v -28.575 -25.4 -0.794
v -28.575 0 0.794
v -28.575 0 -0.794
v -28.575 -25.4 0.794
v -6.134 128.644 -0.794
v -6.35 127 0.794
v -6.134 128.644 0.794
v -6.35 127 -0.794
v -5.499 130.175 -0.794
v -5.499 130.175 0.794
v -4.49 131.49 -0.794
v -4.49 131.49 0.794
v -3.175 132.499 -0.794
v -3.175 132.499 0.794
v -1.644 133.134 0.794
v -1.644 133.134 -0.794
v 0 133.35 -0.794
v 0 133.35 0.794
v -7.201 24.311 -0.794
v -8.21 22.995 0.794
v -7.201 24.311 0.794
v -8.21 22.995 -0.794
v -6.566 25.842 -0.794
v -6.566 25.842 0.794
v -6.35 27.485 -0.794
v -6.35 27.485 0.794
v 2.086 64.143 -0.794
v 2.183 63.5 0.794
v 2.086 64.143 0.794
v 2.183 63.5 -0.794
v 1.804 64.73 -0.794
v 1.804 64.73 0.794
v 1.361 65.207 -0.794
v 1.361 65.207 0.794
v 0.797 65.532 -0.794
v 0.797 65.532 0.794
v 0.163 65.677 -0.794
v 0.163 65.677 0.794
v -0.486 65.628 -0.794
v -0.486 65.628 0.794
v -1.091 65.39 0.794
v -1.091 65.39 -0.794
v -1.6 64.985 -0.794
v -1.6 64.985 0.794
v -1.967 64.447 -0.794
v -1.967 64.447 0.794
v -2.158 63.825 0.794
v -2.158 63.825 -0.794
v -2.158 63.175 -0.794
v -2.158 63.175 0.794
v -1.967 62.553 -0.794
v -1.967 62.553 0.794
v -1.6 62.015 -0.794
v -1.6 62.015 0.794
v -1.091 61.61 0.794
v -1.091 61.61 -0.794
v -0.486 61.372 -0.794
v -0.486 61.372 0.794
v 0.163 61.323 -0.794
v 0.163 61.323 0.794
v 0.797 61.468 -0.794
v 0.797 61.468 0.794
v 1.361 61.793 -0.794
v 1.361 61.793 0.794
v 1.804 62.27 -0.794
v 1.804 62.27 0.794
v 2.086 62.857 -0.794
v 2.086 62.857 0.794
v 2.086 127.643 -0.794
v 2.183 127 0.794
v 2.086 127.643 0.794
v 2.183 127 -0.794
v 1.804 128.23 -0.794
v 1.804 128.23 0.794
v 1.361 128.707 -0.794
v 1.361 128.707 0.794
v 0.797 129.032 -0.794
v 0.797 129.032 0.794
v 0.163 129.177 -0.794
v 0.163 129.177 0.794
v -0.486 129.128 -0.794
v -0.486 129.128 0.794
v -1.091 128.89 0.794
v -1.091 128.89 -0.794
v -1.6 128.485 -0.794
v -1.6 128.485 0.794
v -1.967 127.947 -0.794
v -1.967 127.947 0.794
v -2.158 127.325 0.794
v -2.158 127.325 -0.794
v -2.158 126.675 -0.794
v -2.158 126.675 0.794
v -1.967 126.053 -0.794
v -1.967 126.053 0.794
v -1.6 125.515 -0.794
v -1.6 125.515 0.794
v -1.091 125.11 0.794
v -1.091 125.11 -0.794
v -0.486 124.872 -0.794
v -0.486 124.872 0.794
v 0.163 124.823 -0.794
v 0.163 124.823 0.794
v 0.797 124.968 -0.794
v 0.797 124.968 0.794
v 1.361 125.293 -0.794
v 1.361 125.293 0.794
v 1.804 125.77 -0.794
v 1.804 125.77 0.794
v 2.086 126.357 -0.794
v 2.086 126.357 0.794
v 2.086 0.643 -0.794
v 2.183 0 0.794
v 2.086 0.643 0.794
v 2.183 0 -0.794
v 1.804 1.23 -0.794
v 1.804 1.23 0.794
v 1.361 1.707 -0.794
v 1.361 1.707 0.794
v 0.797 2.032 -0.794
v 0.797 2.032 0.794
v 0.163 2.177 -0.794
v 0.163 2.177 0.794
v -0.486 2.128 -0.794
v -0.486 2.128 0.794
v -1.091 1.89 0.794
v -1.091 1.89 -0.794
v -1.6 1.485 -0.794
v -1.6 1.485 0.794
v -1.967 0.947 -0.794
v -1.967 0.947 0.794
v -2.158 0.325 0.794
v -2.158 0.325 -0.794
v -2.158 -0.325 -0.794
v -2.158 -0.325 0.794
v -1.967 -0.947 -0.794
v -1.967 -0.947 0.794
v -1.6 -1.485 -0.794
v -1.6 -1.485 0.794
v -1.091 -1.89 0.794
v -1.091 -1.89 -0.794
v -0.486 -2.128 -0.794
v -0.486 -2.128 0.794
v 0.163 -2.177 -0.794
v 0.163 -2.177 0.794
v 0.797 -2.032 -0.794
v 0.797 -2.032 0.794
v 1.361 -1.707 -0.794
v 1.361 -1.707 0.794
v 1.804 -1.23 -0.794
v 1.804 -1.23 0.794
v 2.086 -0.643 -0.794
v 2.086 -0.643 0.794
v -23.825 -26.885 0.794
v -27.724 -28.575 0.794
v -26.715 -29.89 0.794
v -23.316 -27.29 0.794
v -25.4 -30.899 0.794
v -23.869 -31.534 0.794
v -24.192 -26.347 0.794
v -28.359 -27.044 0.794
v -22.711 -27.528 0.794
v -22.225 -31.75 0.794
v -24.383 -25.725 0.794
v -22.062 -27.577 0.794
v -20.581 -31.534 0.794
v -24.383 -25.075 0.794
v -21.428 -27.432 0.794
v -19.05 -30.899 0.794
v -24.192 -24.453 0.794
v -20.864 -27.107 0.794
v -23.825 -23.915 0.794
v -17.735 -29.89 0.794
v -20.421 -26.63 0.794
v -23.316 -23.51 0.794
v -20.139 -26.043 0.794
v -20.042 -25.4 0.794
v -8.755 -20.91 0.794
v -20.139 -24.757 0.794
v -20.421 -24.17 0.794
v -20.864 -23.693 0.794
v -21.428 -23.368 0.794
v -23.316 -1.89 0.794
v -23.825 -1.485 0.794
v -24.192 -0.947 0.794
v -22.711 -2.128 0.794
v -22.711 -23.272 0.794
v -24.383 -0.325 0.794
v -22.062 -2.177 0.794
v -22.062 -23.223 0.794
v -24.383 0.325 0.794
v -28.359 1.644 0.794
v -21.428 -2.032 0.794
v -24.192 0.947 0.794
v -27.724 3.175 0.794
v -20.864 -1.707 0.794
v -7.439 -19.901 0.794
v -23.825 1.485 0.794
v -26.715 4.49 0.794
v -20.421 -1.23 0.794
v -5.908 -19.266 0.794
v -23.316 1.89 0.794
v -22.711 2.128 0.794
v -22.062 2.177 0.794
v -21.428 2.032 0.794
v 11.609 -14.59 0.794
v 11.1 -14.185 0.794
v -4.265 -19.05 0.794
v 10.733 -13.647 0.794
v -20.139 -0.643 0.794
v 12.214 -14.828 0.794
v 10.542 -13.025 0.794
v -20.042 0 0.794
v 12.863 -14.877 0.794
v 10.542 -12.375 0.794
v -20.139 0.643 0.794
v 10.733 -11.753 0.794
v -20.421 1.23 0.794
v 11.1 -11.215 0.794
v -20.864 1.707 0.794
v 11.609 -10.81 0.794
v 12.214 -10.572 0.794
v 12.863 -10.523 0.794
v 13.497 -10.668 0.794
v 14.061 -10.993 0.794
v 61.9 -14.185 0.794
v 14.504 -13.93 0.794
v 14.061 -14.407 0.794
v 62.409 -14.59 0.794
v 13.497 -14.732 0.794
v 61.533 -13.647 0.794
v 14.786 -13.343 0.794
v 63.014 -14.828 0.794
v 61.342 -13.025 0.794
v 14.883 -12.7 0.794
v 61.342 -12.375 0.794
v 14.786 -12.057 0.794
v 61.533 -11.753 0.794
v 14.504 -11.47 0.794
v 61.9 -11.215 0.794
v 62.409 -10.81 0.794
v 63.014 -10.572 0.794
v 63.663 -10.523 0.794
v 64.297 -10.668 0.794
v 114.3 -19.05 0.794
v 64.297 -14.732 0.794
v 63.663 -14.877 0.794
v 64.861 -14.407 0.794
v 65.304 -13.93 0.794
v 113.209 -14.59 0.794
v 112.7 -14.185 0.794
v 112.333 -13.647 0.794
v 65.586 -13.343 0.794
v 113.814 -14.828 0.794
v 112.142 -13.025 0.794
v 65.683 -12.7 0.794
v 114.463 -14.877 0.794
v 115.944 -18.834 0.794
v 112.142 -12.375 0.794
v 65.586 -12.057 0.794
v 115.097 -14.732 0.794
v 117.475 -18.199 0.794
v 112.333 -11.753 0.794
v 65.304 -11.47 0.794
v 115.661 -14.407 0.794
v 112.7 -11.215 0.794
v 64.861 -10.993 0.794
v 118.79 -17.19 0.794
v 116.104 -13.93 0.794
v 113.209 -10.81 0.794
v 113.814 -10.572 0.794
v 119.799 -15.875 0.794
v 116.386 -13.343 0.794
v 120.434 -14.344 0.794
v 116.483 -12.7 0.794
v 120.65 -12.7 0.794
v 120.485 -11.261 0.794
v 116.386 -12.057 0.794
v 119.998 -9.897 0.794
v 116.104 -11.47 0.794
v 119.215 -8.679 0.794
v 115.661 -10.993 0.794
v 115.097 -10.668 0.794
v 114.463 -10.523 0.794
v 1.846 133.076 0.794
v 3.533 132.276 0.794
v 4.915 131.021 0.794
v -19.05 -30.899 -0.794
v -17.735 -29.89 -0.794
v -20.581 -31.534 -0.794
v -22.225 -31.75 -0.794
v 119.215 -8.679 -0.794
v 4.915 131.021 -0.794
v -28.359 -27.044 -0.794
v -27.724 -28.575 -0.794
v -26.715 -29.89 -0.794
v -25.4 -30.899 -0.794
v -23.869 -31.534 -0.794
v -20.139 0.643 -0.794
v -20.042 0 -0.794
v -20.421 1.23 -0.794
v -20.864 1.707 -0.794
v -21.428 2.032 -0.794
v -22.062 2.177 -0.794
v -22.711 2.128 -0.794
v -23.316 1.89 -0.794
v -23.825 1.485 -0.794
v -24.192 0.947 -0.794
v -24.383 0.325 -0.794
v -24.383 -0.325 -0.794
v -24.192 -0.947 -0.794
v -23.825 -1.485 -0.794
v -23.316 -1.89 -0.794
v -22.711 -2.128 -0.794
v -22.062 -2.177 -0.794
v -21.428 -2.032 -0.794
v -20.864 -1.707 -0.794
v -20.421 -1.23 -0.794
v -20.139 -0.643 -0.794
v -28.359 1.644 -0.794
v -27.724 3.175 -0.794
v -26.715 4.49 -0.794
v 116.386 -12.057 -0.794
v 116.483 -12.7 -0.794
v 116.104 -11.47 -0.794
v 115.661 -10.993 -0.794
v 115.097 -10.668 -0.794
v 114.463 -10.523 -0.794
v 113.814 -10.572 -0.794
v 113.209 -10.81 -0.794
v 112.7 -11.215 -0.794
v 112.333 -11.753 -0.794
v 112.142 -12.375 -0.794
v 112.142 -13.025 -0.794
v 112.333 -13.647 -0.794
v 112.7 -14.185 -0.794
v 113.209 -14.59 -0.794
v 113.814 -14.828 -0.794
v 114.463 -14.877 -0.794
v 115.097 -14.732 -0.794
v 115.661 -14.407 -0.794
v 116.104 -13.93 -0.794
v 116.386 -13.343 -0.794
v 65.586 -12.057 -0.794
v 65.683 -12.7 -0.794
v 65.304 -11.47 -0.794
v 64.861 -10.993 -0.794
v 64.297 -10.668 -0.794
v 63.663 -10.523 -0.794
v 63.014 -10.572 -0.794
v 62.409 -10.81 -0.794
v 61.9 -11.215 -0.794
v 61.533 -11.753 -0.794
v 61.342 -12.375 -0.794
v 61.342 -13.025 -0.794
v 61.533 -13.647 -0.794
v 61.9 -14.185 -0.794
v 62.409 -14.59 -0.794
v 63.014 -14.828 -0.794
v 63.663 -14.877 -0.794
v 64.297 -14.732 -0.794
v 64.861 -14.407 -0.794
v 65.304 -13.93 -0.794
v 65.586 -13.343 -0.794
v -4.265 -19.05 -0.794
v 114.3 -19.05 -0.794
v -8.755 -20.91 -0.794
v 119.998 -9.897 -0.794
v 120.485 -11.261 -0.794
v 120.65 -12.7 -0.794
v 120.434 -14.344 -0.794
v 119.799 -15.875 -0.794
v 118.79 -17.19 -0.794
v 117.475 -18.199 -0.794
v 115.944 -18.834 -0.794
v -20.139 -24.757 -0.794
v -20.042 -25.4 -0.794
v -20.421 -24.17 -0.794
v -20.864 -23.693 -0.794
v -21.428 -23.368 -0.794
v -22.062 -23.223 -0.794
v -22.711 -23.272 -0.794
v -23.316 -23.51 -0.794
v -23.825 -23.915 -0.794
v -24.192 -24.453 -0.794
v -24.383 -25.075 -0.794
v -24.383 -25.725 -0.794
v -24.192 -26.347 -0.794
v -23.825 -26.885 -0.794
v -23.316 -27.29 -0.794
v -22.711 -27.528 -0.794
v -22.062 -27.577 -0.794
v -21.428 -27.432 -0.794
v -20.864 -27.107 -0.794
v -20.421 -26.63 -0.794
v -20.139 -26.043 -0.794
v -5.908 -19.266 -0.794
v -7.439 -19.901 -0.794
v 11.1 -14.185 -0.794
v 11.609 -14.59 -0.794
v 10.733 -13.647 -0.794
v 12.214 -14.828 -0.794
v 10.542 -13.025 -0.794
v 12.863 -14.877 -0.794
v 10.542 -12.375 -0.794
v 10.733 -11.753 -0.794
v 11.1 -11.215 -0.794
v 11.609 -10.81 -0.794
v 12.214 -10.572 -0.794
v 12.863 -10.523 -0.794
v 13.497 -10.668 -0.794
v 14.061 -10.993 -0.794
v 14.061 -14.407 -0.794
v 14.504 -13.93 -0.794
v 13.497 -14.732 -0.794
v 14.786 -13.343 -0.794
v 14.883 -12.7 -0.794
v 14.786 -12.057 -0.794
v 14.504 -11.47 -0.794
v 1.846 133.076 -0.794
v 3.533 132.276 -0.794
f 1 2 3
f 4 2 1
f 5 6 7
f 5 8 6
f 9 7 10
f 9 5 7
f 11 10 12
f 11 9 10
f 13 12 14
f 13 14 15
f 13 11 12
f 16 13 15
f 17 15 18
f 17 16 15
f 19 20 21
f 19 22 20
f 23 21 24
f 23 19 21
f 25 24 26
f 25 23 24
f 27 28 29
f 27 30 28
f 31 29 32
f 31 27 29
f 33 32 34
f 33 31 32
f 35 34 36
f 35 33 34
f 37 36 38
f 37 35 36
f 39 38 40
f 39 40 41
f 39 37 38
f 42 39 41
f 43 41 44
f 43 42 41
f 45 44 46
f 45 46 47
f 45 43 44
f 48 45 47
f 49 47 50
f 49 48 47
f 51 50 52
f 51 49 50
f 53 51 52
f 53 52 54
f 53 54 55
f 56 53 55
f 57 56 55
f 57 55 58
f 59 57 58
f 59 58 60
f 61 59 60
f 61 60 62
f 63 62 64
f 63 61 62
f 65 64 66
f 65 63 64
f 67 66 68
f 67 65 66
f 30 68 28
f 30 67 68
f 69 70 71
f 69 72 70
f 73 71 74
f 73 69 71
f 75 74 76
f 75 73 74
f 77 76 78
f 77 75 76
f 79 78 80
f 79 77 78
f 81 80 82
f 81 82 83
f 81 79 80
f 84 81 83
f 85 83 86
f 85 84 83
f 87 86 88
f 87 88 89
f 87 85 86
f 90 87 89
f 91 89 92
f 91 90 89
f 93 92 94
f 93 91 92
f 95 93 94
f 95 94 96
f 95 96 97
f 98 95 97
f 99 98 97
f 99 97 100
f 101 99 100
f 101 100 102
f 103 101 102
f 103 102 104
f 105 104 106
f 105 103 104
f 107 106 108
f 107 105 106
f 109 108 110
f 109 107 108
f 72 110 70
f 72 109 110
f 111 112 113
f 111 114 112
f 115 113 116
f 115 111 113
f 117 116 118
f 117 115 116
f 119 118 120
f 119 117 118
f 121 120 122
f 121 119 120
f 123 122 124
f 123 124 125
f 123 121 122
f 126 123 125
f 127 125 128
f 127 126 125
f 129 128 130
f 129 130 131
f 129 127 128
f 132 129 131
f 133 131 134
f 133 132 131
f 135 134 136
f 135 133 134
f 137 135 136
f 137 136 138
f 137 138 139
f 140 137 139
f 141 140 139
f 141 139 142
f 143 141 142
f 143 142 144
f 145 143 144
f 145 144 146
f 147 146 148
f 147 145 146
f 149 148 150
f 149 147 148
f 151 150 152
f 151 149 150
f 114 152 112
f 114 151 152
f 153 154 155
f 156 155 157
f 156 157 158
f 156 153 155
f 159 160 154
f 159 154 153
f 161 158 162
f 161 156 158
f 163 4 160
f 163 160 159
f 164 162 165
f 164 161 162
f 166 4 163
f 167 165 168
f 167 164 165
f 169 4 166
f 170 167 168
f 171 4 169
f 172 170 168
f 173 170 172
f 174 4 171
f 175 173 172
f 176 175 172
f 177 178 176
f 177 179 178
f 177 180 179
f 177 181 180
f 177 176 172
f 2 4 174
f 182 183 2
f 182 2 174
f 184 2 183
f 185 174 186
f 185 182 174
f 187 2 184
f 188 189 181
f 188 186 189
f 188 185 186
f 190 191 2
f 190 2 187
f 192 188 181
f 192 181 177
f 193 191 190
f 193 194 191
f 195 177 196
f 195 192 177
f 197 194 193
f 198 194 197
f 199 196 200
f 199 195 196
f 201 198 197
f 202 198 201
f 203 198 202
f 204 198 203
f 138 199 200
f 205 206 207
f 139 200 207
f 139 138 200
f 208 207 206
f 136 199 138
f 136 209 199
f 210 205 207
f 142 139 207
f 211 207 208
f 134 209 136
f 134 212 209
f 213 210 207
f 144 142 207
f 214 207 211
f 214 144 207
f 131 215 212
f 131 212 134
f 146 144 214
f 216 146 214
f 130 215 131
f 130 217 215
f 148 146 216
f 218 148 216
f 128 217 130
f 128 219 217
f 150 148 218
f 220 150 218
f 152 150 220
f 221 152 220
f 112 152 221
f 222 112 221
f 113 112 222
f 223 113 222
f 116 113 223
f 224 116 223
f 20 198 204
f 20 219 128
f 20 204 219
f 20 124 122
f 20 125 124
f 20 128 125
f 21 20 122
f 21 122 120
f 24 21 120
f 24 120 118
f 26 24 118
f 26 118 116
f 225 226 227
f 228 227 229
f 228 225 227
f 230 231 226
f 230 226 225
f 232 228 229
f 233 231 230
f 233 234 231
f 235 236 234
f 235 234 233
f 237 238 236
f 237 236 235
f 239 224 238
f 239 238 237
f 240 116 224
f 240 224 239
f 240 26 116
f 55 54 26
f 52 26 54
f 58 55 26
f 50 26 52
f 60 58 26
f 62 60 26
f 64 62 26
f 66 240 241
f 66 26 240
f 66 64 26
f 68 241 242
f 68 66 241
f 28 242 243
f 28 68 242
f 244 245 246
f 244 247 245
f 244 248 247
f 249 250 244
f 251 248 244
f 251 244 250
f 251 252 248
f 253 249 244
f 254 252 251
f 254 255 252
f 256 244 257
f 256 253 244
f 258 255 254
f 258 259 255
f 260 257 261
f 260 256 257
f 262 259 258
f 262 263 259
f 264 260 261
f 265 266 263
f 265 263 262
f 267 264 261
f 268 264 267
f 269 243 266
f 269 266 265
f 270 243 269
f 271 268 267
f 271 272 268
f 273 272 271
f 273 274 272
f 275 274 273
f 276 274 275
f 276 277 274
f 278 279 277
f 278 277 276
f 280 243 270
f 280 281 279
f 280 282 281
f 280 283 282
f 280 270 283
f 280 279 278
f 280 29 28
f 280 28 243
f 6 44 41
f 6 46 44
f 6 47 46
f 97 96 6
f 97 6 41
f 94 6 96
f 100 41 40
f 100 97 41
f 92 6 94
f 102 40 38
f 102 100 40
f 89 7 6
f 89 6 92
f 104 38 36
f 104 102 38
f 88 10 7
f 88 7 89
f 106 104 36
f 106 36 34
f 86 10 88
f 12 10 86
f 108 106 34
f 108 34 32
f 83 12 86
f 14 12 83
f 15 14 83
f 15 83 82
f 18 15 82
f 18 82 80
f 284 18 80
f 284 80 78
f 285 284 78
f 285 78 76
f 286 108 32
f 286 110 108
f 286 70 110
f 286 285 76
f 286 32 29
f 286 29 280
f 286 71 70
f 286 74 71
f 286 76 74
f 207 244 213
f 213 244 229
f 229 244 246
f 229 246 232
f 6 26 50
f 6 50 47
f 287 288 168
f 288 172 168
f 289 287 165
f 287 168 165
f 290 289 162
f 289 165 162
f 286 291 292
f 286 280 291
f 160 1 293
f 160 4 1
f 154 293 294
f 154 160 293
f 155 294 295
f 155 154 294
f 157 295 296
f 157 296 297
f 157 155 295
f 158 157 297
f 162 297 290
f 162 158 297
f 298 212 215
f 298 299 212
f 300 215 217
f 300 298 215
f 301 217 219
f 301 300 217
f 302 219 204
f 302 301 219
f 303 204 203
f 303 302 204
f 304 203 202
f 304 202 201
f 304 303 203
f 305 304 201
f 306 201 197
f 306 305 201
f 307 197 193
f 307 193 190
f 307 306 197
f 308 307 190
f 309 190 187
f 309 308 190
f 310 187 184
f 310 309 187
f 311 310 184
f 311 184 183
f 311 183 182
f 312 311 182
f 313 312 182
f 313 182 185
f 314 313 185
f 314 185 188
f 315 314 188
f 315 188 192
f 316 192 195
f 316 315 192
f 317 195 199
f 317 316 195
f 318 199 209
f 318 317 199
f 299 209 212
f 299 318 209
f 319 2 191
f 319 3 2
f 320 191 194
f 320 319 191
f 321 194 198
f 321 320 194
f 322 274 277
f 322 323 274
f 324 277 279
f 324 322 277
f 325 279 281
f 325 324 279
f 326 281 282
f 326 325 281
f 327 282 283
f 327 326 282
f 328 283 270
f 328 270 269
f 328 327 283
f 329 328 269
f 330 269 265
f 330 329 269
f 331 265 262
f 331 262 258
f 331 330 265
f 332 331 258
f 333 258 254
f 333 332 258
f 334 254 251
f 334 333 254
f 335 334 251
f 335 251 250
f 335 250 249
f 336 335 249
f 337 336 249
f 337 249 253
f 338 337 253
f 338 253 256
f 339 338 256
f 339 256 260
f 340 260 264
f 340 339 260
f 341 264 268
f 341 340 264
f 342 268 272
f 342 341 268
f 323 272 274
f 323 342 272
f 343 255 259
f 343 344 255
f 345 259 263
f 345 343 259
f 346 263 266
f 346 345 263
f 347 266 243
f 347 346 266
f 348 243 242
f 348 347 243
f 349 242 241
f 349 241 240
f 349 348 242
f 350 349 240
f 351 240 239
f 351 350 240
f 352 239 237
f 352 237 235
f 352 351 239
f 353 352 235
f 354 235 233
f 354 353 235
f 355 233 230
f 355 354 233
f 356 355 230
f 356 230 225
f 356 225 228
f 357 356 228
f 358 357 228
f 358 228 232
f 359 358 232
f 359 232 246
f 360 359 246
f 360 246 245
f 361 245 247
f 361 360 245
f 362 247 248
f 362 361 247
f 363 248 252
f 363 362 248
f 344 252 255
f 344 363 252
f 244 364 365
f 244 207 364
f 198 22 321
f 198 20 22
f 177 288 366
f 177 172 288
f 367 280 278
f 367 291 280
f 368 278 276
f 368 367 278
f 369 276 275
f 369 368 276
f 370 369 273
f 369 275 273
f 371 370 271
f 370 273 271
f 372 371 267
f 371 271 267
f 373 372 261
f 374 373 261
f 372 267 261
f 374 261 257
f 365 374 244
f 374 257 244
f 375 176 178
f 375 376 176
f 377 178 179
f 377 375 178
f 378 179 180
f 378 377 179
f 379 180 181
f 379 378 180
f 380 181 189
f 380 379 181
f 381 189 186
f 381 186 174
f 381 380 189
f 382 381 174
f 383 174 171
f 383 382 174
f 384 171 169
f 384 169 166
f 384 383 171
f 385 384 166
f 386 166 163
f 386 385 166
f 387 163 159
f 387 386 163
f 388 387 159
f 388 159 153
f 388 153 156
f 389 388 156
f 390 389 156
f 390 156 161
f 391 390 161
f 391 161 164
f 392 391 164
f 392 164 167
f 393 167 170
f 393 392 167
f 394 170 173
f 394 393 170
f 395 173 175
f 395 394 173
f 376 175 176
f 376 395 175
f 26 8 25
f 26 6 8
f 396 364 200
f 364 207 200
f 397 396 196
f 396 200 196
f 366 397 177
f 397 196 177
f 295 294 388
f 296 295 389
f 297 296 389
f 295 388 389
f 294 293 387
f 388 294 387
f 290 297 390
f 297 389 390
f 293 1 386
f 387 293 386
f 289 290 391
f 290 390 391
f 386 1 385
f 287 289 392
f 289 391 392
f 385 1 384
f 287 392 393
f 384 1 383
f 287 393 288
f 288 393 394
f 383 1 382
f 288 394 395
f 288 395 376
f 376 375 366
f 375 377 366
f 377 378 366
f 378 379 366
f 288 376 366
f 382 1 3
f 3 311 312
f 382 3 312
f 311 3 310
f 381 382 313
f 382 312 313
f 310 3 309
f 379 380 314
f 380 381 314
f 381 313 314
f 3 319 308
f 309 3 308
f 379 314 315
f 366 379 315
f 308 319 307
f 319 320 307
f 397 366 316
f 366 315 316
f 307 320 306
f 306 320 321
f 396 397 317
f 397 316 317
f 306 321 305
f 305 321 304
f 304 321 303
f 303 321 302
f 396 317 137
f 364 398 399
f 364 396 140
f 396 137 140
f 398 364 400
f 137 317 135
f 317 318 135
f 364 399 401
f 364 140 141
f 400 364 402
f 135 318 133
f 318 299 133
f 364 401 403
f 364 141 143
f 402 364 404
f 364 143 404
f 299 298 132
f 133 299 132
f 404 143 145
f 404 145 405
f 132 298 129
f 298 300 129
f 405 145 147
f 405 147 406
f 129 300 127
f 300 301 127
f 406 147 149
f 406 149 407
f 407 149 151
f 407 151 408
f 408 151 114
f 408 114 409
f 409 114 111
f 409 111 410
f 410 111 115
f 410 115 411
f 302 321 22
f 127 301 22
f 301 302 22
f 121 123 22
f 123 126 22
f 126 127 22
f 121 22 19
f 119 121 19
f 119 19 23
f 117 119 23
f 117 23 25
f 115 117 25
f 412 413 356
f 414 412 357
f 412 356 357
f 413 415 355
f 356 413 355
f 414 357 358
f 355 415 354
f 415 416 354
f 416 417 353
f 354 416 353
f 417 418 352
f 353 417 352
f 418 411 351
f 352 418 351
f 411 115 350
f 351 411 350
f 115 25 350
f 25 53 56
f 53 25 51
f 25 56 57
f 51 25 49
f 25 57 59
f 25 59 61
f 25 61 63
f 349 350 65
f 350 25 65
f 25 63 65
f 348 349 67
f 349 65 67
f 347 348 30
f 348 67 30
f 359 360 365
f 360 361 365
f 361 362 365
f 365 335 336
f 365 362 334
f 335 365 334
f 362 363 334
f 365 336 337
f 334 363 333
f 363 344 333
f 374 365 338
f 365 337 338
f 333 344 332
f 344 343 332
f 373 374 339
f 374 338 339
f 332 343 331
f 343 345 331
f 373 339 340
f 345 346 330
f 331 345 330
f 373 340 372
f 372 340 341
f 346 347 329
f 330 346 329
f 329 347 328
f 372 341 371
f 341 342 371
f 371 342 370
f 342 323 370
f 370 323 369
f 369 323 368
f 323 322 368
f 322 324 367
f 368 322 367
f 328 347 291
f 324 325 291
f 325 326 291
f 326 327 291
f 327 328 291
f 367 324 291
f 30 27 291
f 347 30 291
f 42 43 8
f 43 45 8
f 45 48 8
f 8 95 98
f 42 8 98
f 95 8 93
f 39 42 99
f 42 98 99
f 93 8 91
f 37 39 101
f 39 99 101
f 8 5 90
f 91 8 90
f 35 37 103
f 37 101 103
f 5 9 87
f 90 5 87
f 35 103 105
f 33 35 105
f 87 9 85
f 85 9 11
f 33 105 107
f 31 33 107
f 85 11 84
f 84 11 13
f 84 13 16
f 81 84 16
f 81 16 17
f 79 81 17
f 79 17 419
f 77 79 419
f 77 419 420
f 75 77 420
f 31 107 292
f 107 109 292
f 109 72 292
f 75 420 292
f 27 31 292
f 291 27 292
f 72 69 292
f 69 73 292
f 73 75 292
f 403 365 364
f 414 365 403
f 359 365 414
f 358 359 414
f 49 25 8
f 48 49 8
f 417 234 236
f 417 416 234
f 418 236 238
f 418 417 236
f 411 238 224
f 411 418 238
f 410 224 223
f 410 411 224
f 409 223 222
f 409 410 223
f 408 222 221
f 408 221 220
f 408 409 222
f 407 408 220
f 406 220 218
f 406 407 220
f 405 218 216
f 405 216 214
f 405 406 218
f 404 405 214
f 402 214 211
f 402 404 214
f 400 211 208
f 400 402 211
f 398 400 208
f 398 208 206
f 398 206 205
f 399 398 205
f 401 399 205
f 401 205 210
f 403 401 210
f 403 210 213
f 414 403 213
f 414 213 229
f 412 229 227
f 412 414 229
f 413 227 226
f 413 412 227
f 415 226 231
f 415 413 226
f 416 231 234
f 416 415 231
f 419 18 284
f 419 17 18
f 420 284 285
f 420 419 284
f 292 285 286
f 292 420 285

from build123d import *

# Parameters (mm, degrees)
SKETCH1_R           = 2.1828125
BOSS_EXTRUDE1_DEPTH = 0.79375
FILLET1_R           = 6.35


with BuildPart() as part:
    # Sketch1 → Boss-Extrude1 (new, symmetric)
    with BuildSketch(Plane.XY):
        Polygon((-28.575, 2.630256121), (-28.575, -31.75), (-19.594743879, -31.75), (-6.894743879, -19.05), (120.65, -19.05), (120.65, -10.433282549), (3.00913246, 133.35), (-6.35, 133.35), (-6.35, 24.855256121), align=None)
        Circle(SKETCH1_R, mode=Mode.SUBTRACT)
        with Locations((0, 63.5)):
            Circle(SKETCH1_R, mode=Mode.SUBTRACT)
        with Locations((12.7, -12.7)):
            Circle(SKETCH1_R, mode=Mode.SUBTRACT)
        with Locations((63.5, -12.7)):
            Circle(SKETCH1_R, mode=Mode.SUBTRACT)
        with Locations((-22.225, 0)):
            Circle(SKETCH1_R, mode=Mode.SUBTRACT)
        with Locations((-22.225, -25.4)):
            Circle(SKETCH1_R, mode=Mode.SUBTRACT)
        with Locations((0, 127)):
            Circle(SKETCH1_R, mode=Mode.SUBTRACT)
        with Locations((114.3, -12.7)):
            Circle(SKETCH1_R, mode=Mode.SUBTRACT)
    extrude(amount=BOSS_EXTRUDE1_DEPTH, both=True)

    # Fillet1
    fillet1_edges = [part.edges().sort_by_distance(p)[0] for p in [
        (120.65, -19.05, 0),
        (120.65, -10.433282549, 0),
        (-6.894743879, -19.05, 0),
        (-19.594743879, -31.75, 0),
        (-28.575, -31.75, 0),
        (-28.575, 2.630256121, 0),
        (-6.35, 24.855256121, 0),
        (3.00913246, 133.35, 0),
        (-6.35, 133.35, 0),
    ]]
    fillet(fillet1_edges, radius=FILLET1_R - 0.0001)  # a hair under: the kernel refuses the full size


solid = part.part
